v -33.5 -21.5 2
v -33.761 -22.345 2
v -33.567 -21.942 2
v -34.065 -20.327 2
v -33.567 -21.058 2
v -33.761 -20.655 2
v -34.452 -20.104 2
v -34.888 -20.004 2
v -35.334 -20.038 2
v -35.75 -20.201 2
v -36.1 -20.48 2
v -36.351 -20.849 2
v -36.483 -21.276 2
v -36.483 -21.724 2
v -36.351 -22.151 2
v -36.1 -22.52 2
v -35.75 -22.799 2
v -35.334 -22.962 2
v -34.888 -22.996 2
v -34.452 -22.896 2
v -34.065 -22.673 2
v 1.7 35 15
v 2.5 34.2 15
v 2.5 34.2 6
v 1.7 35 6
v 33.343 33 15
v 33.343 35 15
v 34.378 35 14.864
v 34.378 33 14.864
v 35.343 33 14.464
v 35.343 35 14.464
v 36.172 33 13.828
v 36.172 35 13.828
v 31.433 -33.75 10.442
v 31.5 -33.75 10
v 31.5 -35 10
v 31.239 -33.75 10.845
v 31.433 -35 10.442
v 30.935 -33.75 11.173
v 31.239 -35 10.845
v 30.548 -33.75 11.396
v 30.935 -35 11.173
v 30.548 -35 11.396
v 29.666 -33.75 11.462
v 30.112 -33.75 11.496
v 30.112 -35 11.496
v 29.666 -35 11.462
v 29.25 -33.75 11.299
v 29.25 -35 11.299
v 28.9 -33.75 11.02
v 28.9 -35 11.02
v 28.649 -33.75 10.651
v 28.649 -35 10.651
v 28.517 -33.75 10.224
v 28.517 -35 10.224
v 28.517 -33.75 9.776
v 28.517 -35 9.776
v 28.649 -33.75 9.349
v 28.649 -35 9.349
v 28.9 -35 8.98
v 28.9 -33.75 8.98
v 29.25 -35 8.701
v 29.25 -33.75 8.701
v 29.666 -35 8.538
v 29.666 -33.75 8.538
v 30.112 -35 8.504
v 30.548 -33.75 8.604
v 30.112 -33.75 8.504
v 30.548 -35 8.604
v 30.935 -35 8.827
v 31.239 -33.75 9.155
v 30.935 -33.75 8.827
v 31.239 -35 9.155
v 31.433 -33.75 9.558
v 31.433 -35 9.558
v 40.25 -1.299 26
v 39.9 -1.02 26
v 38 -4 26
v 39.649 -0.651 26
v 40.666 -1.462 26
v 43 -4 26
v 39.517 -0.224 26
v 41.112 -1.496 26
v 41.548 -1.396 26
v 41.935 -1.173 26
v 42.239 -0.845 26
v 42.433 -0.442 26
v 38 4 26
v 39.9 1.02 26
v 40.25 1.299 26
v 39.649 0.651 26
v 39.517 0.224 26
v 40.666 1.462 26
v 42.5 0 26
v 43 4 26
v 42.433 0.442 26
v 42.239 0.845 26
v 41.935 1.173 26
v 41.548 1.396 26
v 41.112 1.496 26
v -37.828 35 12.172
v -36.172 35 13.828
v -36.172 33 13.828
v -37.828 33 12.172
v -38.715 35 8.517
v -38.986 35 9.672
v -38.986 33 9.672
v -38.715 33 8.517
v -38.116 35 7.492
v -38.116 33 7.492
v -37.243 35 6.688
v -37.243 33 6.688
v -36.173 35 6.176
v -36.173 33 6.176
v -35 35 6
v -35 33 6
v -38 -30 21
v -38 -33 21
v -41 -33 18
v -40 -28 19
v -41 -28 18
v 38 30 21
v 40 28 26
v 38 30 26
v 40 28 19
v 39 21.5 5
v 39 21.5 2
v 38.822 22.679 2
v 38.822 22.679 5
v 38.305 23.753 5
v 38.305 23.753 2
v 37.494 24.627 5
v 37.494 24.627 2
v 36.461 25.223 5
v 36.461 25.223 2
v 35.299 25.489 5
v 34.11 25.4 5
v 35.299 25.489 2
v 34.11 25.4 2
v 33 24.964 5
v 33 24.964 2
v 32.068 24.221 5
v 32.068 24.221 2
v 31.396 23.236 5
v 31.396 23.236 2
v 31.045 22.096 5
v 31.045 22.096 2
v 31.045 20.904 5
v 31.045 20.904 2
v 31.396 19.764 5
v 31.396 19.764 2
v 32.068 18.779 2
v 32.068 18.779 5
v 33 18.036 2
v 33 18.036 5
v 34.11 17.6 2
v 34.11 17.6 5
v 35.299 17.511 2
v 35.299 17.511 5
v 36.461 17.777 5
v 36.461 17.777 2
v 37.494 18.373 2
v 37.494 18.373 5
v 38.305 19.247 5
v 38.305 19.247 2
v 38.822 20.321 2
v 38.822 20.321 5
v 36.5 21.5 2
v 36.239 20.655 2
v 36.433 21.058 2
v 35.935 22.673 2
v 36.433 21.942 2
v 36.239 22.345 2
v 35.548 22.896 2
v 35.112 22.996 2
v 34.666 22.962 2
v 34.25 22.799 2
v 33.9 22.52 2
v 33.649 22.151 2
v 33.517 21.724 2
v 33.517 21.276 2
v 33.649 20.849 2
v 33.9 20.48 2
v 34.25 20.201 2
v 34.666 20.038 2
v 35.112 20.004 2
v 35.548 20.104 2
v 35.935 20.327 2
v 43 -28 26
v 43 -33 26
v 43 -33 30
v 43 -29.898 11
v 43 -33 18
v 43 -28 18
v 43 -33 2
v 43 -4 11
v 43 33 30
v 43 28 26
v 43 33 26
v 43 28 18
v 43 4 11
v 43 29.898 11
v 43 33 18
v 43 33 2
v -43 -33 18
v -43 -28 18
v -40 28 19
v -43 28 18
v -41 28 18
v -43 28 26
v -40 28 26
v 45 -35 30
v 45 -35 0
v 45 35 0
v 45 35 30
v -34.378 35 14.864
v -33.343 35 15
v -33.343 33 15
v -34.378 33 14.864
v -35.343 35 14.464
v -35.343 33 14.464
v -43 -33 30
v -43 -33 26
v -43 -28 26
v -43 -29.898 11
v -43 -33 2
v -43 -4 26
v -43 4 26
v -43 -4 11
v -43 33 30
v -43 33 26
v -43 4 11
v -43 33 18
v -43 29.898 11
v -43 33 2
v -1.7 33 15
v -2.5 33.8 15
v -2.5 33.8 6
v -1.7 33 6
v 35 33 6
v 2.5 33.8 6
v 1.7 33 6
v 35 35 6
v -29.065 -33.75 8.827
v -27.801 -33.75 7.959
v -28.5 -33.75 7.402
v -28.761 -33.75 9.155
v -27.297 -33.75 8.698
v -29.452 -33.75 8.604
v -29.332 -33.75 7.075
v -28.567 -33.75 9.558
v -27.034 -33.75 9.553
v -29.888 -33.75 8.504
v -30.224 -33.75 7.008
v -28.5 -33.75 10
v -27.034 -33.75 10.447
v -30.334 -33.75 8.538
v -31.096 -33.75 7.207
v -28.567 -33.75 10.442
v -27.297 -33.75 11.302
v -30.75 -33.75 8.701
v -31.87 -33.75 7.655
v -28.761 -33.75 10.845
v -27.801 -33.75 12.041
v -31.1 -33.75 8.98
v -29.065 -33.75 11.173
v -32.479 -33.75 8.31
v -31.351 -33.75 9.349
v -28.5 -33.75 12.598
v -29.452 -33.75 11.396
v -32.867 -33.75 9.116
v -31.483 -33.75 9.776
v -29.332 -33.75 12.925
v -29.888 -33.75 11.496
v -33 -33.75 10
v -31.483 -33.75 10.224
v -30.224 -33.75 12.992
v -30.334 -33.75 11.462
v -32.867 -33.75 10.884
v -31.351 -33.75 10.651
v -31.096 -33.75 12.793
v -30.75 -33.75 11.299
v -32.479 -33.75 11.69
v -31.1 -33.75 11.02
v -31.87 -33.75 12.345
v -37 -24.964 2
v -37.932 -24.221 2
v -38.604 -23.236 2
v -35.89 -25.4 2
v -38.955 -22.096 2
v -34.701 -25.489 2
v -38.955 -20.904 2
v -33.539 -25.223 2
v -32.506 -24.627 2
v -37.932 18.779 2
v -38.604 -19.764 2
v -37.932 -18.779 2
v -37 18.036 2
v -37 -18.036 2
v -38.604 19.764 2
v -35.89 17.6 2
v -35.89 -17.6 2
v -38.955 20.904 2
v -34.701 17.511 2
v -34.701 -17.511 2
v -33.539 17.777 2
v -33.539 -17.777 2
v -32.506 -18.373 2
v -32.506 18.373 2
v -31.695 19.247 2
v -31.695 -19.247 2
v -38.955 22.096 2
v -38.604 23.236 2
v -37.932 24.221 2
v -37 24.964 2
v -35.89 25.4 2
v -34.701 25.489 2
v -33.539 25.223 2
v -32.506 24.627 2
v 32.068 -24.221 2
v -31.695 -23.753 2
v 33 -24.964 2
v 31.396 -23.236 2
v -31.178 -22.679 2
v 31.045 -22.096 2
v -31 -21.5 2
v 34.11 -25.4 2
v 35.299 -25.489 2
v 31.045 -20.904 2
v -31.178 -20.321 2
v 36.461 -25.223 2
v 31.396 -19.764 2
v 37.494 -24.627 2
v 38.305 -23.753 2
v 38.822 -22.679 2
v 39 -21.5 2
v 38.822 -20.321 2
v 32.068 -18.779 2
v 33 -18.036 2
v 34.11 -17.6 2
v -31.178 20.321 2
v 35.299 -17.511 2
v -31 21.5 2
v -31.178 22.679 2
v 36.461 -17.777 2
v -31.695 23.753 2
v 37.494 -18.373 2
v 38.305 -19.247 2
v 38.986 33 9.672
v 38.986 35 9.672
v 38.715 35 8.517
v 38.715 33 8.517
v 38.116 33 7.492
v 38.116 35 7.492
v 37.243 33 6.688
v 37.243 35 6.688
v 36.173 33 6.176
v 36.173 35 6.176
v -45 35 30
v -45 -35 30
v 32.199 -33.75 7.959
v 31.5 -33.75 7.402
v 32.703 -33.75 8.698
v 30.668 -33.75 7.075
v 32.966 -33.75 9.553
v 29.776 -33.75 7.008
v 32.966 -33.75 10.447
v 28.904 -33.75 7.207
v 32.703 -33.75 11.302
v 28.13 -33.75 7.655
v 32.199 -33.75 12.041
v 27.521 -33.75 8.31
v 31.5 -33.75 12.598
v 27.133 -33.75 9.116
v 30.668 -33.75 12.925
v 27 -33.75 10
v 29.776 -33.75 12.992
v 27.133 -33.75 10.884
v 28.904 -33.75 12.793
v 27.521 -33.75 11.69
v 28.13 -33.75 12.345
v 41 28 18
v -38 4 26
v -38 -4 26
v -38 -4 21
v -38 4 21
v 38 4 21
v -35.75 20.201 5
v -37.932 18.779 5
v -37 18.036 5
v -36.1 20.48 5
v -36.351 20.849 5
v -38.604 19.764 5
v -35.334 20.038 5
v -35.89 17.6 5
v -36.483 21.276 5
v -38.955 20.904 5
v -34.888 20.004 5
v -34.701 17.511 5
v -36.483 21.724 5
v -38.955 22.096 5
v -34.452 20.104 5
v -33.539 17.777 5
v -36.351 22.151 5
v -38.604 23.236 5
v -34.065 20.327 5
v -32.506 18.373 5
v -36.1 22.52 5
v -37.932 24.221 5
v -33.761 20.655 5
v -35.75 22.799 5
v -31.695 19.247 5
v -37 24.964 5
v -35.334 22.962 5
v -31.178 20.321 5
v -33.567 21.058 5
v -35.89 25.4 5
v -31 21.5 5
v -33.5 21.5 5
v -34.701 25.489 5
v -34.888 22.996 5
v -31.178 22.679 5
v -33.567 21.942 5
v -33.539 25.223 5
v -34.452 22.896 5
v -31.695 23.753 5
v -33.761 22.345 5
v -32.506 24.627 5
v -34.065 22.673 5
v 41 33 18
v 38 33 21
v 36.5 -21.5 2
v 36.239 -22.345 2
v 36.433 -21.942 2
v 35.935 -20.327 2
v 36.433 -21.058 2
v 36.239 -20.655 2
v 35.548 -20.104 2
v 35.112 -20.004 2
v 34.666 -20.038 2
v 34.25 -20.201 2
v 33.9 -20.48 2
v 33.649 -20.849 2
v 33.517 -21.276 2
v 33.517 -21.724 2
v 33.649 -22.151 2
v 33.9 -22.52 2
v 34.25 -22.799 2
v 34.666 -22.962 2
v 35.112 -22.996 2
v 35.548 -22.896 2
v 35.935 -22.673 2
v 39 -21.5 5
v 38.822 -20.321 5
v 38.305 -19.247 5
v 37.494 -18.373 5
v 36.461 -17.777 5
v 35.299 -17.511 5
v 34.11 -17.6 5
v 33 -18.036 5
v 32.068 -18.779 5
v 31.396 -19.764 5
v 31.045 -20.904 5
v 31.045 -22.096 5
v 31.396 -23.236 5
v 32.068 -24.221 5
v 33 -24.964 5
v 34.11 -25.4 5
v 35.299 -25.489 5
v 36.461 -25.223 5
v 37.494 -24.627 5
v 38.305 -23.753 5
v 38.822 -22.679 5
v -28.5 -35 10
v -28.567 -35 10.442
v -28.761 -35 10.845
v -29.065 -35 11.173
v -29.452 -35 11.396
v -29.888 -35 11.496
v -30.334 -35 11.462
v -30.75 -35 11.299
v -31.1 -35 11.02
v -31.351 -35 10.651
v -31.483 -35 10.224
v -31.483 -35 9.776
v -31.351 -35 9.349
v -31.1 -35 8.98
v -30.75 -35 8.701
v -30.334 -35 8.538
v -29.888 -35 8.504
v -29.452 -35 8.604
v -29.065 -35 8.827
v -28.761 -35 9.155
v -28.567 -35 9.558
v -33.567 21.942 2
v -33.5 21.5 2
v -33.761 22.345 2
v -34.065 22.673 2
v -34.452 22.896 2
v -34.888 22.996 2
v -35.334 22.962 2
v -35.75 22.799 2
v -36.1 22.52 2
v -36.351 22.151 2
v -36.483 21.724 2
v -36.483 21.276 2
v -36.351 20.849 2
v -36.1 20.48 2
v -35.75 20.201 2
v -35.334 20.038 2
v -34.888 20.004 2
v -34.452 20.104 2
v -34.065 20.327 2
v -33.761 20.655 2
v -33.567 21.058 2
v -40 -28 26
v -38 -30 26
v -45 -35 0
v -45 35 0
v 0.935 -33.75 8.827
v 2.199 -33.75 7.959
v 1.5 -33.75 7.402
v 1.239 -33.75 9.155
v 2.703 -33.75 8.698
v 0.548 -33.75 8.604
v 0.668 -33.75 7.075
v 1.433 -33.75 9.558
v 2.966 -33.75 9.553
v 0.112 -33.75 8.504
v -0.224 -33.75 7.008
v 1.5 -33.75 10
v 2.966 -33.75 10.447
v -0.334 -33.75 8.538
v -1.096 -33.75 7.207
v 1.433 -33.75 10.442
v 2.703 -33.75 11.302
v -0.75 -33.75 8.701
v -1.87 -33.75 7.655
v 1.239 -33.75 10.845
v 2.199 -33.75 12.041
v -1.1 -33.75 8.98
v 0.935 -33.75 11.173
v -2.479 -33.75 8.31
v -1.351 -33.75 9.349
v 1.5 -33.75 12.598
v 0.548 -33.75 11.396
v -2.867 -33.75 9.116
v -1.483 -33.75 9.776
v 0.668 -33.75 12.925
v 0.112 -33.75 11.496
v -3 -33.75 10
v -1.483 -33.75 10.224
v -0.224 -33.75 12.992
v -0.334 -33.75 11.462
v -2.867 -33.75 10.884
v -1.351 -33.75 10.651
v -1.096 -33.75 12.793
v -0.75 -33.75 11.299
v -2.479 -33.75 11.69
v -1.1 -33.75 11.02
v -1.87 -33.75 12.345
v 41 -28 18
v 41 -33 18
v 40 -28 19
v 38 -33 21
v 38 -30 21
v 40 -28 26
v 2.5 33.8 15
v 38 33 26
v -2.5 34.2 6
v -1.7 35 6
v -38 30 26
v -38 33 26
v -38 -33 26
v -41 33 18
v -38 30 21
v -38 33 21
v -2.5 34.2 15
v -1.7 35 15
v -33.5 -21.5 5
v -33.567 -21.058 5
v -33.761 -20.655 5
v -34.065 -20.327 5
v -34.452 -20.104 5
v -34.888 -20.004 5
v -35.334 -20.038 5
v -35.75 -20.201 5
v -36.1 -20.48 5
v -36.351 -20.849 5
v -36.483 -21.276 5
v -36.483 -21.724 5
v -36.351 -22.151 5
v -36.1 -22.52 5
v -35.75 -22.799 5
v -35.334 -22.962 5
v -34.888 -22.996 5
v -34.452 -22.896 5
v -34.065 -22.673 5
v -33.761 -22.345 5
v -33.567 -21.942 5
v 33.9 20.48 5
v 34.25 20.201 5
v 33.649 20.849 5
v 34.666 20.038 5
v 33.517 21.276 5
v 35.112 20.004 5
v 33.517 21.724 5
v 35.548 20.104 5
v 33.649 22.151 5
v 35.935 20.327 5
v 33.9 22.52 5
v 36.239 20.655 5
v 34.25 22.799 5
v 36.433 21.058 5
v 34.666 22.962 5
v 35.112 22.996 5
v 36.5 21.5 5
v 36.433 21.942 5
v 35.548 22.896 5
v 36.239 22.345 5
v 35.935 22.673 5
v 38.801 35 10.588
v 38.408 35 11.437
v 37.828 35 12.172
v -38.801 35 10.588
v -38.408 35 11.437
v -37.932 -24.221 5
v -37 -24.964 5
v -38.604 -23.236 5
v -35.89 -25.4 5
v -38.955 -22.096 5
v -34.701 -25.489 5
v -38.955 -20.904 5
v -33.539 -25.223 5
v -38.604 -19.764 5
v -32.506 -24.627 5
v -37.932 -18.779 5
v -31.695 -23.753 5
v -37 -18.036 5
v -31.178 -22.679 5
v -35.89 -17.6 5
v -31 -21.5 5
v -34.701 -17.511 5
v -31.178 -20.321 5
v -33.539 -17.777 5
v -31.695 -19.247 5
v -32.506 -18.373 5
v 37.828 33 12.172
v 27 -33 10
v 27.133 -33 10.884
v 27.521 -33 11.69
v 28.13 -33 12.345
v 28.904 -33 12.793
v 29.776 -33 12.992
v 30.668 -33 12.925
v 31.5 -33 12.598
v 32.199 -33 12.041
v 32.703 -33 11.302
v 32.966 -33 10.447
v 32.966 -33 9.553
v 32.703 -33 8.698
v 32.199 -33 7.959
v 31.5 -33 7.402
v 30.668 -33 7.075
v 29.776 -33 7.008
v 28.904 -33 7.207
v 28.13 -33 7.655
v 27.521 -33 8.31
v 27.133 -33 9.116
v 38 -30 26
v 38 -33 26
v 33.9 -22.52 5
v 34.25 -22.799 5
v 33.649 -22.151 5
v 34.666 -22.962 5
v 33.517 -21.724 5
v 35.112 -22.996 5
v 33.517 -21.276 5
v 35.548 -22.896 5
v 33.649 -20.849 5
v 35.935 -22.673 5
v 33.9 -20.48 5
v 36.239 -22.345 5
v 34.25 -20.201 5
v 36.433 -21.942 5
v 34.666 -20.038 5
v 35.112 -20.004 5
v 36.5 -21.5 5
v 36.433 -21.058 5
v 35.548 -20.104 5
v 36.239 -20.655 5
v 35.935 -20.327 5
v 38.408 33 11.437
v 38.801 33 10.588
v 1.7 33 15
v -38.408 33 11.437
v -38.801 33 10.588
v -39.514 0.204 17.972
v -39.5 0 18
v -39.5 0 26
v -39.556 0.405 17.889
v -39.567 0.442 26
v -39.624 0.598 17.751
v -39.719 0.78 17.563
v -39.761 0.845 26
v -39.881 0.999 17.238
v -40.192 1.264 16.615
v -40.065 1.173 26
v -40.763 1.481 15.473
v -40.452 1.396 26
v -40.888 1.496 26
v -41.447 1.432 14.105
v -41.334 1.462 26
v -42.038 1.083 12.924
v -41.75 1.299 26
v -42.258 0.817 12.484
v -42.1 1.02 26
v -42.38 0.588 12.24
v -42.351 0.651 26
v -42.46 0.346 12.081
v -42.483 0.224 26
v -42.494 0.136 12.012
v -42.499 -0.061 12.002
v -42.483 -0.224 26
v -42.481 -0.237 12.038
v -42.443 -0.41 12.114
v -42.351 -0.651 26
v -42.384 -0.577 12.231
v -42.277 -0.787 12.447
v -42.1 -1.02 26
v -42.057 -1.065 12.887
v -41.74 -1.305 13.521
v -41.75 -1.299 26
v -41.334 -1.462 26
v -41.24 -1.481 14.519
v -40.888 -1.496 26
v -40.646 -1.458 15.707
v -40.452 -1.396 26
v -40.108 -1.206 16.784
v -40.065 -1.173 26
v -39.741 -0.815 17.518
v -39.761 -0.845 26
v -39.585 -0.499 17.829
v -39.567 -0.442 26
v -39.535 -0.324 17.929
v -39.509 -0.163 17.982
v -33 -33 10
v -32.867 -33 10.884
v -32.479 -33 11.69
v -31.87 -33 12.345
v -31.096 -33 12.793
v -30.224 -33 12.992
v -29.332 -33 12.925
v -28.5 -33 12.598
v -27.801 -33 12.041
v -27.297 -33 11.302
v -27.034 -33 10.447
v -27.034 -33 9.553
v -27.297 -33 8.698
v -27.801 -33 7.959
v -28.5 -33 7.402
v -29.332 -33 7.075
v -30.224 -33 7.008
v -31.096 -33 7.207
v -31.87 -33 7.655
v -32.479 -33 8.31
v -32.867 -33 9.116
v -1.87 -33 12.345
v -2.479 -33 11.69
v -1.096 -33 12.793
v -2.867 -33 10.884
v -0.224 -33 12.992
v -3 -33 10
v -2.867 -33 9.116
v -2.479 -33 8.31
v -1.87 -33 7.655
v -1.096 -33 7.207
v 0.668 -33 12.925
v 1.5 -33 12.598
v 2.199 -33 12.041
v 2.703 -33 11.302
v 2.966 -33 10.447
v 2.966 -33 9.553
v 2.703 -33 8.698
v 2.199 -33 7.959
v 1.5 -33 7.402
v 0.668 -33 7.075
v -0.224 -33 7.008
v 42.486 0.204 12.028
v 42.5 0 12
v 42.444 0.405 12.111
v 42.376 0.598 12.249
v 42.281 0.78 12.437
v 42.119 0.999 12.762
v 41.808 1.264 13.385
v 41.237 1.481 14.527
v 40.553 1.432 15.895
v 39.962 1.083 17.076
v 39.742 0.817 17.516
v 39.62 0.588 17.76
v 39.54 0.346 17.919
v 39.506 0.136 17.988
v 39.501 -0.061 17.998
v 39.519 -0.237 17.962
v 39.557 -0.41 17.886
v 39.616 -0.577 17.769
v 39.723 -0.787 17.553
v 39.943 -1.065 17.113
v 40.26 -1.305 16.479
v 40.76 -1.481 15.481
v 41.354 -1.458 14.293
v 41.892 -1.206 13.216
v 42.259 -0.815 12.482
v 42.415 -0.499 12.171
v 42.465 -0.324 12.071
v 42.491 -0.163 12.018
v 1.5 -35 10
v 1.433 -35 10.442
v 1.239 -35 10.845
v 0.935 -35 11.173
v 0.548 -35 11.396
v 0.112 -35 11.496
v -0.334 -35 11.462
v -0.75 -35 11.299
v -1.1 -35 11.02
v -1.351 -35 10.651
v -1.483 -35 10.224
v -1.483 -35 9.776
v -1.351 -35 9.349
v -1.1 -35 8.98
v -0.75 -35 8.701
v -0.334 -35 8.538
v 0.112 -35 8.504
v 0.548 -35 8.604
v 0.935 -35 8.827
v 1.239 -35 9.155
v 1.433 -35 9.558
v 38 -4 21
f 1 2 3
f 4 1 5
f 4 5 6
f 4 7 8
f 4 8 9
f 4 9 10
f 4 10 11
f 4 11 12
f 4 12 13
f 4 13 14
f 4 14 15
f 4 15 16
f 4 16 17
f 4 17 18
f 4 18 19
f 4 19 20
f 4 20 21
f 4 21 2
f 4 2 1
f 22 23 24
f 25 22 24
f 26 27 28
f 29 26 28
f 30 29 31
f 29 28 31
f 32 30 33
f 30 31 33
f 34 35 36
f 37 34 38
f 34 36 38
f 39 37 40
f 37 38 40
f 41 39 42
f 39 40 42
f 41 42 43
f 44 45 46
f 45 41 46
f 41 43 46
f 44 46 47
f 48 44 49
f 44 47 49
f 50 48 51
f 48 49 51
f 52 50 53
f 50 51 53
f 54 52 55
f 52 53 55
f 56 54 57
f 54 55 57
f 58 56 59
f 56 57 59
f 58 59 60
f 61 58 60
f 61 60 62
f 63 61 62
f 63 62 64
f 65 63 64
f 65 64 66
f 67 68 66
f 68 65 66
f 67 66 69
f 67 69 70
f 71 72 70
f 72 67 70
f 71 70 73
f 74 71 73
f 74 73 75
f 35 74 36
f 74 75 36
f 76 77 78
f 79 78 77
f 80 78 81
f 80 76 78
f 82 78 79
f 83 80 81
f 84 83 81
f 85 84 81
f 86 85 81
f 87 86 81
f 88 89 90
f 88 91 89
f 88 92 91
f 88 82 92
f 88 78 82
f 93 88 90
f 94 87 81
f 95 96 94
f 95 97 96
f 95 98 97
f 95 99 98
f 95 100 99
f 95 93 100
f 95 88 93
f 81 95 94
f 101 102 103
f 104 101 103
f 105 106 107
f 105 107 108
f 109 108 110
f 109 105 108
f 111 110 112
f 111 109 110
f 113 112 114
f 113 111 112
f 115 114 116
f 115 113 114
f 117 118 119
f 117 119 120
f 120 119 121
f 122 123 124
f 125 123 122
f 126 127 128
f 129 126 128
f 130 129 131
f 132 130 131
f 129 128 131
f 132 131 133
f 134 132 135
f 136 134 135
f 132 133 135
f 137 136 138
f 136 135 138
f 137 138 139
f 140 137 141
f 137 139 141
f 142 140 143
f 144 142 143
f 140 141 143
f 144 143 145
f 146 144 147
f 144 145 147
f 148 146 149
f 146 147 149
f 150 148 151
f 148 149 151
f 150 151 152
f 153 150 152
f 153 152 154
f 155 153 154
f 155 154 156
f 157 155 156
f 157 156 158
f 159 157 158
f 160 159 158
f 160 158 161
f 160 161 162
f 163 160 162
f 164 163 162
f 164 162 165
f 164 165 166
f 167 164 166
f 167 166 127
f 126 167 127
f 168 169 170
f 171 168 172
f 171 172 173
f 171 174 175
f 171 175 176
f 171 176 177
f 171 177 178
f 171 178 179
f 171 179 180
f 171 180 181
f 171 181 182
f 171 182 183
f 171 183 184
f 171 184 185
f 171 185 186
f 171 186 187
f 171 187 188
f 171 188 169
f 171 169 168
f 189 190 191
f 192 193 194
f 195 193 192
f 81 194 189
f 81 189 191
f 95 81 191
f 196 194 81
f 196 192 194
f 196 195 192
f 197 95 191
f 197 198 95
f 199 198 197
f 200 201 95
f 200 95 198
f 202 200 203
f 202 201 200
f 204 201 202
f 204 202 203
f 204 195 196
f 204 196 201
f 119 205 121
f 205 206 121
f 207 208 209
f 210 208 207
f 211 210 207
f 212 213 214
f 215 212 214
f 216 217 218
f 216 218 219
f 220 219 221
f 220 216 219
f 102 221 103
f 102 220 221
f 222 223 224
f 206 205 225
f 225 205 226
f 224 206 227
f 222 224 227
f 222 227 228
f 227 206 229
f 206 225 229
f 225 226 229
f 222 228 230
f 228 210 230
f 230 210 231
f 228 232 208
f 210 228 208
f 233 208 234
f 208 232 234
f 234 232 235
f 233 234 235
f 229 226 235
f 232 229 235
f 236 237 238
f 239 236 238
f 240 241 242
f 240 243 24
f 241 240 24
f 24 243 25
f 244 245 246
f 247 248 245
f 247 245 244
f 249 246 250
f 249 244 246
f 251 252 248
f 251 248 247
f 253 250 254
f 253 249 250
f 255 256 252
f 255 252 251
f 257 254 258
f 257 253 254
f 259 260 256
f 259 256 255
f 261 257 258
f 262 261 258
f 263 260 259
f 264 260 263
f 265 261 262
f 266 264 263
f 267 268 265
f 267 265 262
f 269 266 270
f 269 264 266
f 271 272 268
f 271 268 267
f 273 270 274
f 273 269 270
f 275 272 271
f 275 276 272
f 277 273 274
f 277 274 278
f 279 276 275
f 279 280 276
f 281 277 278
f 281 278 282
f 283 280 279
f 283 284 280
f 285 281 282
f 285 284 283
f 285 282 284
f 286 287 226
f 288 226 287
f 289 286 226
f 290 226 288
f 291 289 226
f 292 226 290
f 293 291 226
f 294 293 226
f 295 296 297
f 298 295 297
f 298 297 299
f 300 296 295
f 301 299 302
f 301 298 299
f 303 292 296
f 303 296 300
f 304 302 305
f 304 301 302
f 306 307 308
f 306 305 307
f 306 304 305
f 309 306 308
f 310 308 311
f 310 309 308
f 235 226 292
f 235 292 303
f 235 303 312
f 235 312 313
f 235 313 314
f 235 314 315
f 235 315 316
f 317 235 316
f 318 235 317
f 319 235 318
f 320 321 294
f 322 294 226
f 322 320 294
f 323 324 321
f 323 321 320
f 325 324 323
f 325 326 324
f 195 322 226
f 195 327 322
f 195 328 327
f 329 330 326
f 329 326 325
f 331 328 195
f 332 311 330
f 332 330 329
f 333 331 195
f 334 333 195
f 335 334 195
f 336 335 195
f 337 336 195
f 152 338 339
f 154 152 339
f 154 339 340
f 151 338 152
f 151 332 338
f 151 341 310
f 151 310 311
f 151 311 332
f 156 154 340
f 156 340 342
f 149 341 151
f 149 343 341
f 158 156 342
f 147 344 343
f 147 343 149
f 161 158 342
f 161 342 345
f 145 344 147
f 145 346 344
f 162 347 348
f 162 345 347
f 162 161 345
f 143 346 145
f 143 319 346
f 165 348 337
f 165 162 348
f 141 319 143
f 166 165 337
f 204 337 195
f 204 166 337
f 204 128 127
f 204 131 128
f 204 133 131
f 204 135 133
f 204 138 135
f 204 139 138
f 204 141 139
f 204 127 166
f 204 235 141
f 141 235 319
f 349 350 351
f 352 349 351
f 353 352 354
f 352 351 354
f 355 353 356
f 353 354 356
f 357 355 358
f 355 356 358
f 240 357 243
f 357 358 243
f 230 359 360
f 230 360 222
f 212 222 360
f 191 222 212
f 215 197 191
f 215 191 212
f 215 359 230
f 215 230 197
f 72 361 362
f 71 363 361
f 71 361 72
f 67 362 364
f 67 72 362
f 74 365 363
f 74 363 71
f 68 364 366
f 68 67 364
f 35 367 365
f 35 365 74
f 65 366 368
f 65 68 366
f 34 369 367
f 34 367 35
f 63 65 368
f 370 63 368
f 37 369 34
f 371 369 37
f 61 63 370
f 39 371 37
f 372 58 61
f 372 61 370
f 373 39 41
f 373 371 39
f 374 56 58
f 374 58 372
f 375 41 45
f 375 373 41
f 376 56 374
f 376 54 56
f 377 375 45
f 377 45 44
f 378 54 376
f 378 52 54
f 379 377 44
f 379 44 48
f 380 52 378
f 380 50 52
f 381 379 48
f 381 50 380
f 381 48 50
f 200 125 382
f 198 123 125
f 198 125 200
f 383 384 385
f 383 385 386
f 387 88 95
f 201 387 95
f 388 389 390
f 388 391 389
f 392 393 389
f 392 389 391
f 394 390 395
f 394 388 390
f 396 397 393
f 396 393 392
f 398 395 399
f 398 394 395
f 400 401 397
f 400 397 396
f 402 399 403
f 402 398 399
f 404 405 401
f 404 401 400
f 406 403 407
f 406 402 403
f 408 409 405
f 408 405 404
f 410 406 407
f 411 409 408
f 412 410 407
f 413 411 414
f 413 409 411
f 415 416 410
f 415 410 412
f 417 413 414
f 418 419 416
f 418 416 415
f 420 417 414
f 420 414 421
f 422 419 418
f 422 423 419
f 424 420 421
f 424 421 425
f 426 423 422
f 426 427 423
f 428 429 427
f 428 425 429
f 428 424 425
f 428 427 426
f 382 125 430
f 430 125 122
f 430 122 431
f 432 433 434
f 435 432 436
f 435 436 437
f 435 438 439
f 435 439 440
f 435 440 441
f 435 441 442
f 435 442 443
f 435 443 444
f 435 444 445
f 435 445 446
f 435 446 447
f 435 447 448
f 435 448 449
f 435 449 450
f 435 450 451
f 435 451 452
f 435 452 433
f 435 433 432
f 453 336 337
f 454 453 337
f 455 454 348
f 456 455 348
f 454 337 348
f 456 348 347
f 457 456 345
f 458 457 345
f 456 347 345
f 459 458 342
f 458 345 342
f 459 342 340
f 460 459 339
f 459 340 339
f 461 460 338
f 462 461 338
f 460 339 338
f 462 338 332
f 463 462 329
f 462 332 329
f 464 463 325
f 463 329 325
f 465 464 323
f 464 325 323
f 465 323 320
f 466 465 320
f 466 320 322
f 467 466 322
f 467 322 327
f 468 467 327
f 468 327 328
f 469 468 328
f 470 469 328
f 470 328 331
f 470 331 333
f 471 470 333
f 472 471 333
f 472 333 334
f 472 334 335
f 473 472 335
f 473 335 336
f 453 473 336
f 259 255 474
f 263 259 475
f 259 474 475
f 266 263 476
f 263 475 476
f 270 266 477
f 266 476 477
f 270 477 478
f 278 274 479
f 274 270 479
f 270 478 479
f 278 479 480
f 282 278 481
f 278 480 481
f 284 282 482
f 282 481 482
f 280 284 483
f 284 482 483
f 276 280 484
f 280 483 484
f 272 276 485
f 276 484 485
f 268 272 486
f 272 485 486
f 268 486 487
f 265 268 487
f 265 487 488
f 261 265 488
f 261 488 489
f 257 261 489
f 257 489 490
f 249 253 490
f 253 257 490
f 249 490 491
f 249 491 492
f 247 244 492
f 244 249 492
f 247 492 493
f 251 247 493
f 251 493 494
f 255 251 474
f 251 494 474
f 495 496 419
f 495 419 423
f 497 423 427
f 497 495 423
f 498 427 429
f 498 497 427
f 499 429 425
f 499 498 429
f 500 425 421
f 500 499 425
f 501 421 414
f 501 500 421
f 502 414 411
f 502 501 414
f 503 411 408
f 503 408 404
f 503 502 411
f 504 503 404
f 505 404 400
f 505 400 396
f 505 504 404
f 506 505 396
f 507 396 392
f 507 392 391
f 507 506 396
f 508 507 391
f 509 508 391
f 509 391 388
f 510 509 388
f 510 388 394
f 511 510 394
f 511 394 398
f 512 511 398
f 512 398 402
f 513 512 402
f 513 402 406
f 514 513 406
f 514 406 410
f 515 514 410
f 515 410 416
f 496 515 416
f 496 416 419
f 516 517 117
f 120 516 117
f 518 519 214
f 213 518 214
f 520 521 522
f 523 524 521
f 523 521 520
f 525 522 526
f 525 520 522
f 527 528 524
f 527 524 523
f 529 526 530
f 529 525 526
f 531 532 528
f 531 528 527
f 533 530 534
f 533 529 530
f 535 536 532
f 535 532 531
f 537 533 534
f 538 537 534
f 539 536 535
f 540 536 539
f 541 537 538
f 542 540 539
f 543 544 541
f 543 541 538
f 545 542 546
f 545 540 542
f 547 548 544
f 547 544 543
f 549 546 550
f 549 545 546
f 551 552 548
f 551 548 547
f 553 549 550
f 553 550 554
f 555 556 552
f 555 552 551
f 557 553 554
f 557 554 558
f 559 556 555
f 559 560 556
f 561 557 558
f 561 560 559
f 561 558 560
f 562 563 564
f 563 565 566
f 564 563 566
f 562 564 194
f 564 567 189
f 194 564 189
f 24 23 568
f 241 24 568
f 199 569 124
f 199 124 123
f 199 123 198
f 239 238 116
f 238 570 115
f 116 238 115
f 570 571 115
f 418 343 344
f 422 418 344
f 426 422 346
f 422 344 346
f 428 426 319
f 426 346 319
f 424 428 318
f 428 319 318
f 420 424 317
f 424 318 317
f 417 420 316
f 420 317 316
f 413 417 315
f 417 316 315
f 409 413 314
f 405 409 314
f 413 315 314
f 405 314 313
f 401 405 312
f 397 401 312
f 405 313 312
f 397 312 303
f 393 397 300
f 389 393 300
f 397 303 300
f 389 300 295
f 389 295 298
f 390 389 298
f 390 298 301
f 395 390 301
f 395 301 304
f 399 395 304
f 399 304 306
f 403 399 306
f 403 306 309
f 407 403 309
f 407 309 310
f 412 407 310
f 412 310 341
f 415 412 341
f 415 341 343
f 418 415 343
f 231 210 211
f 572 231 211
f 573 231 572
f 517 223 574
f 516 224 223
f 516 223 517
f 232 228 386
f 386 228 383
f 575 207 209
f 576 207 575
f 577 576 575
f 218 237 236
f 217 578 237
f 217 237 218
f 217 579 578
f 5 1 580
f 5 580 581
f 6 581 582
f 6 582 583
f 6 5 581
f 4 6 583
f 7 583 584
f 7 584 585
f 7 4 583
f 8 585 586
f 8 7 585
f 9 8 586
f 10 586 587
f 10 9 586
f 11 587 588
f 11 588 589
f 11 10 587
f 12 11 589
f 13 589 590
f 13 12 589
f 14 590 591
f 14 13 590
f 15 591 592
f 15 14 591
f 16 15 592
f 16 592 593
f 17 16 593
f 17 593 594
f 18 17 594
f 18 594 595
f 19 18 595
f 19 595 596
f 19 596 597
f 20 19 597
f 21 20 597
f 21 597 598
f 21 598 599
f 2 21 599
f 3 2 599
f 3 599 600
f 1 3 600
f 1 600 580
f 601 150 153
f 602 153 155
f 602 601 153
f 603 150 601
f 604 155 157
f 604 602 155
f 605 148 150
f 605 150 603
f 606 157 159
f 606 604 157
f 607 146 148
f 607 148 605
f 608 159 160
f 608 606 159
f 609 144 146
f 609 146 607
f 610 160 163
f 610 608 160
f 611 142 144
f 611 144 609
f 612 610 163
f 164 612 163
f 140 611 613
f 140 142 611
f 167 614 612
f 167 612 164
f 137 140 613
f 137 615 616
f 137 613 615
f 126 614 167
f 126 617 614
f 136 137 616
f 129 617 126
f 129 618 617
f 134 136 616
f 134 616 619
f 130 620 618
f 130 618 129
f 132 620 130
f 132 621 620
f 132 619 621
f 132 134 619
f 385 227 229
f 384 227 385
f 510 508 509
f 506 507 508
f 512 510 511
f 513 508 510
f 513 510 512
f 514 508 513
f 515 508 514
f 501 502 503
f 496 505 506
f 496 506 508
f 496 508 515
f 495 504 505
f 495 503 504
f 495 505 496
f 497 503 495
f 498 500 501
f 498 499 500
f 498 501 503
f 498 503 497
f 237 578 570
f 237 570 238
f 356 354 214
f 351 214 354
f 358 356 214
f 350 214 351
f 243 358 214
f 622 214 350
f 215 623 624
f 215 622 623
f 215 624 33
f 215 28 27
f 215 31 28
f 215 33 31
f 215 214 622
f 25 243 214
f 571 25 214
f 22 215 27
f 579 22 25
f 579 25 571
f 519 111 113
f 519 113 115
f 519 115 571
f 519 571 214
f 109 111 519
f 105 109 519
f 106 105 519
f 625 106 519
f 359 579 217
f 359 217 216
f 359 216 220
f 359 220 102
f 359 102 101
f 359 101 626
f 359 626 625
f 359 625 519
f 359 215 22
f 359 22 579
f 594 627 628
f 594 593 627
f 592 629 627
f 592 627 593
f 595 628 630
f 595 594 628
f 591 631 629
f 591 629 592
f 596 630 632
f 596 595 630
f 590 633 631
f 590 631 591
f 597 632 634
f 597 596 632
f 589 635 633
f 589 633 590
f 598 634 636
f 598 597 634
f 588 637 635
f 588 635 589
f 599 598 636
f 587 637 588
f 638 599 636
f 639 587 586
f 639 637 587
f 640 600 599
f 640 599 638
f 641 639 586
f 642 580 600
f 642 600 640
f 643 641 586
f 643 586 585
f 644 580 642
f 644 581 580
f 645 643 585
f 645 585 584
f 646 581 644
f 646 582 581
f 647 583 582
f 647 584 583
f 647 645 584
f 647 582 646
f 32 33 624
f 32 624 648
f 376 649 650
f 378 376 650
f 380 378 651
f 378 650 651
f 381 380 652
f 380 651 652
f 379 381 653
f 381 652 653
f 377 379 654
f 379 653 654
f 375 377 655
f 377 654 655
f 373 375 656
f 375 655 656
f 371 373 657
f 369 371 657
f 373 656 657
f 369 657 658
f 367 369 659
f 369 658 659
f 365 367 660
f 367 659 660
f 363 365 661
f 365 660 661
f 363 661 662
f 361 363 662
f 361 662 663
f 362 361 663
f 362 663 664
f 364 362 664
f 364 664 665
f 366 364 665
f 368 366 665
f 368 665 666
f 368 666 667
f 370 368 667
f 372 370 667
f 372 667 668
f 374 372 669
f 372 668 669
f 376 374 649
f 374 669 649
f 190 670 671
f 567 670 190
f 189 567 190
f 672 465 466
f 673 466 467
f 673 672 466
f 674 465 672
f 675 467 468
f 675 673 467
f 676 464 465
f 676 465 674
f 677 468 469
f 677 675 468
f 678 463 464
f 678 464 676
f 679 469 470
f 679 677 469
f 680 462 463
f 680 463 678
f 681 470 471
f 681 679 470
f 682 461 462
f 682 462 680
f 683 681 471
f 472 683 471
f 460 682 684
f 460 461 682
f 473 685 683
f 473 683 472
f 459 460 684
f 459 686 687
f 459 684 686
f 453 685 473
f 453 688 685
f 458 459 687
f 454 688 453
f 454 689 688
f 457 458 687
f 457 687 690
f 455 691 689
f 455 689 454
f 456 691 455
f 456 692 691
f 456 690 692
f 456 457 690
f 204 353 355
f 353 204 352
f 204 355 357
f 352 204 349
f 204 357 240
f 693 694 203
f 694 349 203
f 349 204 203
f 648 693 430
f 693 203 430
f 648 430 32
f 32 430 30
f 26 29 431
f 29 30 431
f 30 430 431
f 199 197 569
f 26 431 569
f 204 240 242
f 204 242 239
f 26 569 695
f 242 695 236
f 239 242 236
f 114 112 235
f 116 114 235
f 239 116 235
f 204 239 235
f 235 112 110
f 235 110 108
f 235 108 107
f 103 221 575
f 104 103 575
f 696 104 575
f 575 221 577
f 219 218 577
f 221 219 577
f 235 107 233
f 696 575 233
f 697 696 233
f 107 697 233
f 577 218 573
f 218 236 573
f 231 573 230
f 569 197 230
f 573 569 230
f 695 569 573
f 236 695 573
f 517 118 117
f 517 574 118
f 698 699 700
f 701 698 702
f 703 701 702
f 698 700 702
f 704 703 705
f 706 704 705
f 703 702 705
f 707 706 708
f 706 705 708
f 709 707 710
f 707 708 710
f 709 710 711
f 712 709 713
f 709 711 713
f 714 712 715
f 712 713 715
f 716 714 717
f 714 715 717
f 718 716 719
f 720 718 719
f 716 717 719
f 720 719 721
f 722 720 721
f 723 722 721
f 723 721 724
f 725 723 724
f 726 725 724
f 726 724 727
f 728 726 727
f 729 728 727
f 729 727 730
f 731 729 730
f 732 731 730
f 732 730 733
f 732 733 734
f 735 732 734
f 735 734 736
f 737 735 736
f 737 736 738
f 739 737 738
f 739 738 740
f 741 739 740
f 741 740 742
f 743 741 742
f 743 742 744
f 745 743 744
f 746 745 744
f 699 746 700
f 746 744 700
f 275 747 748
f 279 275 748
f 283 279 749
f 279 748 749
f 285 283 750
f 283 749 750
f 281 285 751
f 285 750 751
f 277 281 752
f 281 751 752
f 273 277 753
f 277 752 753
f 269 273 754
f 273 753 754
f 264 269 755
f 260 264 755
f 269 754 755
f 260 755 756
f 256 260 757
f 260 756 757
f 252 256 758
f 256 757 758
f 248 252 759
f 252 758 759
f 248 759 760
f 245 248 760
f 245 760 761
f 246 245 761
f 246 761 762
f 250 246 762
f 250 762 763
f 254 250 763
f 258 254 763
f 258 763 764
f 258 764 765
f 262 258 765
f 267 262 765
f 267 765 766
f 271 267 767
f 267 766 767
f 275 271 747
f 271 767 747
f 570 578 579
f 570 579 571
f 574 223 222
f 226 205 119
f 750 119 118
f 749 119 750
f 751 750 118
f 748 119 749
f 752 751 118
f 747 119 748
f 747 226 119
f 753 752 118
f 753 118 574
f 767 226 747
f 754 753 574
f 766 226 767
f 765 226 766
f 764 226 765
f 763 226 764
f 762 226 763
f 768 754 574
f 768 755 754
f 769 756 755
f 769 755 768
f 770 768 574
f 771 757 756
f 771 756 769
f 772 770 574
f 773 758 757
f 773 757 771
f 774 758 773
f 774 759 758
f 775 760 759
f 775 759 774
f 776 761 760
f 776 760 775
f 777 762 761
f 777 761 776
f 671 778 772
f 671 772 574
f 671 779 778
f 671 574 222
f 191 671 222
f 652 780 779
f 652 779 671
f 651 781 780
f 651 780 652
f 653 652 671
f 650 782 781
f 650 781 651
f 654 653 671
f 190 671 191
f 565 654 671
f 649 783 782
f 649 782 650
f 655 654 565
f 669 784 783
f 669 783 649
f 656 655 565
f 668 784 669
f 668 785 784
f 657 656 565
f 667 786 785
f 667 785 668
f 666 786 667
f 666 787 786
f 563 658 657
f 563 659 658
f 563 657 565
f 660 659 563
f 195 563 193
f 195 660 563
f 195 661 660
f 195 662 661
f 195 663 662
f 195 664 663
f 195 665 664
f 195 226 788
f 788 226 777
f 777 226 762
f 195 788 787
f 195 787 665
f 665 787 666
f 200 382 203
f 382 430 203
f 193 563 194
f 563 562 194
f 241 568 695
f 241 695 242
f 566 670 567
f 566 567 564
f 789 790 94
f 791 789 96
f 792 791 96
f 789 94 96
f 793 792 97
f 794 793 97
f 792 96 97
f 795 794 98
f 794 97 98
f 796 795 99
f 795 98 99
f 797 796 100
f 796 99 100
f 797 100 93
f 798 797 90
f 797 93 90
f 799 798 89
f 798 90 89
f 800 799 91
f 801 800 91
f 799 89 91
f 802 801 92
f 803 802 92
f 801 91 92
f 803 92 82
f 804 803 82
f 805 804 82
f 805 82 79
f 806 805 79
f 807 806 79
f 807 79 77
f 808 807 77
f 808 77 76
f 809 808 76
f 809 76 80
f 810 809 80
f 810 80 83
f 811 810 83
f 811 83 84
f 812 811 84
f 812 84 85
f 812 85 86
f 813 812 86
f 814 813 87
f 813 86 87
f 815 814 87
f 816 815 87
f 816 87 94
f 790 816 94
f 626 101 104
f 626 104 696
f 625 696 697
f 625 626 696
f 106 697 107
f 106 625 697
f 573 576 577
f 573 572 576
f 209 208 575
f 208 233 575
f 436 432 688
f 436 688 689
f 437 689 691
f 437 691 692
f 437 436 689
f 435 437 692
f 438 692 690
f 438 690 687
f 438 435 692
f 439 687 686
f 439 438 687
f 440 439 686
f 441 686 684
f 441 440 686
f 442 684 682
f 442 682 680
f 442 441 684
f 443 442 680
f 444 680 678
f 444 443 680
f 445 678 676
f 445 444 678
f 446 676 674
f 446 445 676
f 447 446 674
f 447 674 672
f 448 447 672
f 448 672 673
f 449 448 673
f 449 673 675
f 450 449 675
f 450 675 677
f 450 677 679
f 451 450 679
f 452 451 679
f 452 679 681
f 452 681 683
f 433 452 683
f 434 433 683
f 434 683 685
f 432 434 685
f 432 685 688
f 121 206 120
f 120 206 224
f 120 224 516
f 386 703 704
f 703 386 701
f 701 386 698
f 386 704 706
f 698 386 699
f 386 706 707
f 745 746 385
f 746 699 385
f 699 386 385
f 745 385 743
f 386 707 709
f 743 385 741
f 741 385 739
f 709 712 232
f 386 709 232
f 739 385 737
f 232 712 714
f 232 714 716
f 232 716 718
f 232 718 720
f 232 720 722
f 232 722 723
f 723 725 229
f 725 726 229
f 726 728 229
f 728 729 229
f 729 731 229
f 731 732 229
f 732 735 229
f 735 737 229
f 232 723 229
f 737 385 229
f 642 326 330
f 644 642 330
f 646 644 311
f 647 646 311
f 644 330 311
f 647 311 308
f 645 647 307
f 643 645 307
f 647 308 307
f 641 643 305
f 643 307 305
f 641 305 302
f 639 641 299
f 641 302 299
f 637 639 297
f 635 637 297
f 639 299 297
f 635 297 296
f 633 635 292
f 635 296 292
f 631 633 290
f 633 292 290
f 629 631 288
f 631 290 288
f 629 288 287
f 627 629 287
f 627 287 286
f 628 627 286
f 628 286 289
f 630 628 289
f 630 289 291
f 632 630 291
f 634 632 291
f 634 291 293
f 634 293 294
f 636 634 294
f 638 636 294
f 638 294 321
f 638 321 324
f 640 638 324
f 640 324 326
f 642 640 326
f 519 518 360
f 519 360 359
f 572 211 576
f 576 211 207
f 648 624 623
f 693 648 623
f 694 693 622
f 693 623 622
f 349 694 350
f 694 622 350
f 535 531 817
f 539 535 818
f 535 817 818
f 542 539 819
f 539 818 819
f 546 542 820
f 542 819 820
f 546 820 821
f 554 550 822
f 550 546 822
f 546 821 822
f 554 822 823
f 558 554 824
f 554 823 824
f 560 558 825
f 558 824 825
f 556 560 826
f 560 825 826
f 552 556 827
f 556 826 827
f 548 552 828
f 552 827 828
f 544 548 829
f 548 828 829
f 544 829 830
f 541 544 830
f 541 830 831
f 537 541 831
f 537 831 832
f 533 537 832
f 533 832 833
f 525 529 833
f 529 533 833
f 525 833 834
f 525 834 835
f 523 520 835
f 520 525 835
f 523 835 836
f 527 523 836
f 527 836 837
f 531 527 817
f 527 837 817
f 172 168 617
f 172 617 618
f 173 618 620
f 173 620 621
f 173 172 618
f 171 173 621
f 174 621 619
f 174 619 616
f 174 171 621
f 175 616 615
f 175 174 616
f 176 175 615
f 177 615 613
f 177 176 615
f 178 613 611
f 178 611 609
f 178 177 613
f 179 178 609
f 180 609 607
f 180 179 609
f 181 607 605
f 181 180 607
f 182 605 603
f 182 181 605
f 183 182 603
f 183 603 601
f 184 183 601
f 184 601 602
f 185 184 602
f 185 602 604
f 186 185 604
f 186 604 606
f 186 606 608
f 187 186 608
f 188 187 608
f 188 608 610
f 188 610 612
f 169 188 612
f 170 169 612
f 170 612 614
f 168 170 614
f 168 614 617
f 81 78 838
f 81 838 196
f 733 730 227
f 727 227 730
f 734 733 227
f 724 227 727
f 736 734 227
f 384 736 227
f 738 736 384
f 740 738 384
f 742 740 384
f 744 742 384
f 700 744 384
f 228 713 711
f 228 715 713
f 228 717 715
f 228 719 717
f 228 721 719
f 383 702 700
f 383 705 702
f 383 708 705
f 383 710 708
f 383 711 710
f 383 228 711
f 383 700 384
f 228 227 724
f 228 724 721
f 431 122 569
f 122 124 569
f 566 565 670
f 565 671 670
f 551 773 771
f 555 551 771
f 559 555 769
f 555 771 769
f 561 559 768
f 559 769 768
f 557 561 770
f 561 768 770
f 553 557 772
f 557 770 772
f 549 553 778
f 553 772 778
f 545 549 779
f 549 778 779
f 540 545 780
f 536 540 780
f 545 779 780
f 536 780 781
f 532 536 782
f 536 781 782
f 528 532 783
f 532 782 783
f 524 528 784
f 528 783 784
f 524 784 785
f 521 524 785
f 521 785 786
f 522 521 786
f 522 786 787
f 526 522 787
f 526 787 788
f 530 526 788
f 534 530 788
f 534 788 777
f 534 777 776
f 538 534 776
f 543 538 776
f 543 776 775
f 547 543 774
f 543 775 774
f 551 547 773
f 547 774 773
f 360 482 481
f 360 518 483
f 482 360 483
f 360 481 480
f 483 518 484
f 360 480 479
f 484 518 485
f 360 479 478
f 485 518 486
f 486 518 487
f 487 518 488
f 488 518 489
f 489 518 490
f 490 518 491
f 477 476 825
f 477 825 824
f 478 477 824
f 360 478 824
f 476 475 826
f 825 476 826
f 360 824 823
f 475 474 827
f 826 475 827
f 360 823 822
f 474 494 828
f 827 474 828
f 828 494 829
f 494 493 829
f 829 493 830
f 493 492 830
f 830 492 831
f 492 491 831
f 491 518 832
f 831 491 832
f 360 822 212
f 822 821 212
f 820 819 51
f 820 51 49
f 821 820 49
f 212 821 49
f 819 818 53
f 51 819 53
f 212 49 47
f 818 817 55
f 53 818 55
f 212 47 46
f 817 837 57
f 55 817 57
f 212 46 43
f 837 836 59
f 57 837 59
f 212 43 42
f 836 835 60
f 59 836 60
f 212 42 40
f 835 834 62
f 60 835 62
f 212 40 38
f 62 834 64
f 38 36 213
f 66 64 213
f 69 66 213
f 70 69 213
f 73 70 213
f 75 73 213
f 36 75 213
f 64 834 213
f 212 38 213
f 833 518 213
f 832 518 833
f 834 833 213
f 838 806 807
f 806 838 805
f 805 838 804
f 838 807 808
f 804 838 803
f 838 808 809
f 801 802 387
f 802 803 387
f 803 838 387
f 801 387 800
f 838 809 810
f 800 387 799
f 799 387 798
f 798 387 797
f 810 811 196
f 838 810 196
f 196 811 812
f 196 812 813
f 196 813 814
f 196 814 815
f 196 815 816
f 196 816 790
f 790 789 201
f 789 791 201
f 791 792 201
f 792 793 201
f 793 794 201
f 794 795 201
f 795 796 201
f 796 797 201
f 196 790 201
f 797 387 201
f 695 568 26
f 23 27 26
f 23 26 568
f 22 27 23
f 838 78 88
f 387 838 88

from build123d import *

# Parameters (mm, degrees)
F0_R         = 4
F0_R_2       = 1.5
F1_DEPTH     = 5
F0_W         = 86
F0_H         = 66
F2_DEPTH     = 2
F0_W_2       = 90
F0_H_2       = 70
F3_DEPTH     = 30
F4_R         = 1.5
F5_DEPTH     = 2
F6_R         = 3
F6_R_2       = 1.5
F7_DEPTH     = 0.75
F9_W         = 5
F9_H         = 5
F10_DEPTH    = 8
F11_C1_SIZE  = 3
F11_C2_SIZE  = 3
F11_C3_SIZE  = 3
F11_C4_SIZE  = 3
F12_SIZE     = 2
F13_W        = 78
F13_H        = 9
F14_DEPTH    = 2
F15_SIZE     = 4
F16_T1_DEPTH = 2
F17_W        = 5
F17_H        = 2
F18_DEPTH    = 9
F19_SIZE     = 0.8
F9_H_2       = 8
F9_R         = 1.5
F20_DEPTH    = 15
F21_T4_DEPTH = 59.7965774757
F21_T9_DEPTH = 59.7965774757


# Not quite as in the source:
# - a fillet or chamfer that OpenCascade refuses, or shapes differently, is made with other operations: its cross-section is extruded or revolved along the edge and cut away or added
# - two fillets or chamfers of one size are made in one step


with BuildPart() as f1:
    # F0 (on Top) → F1 (new body)
    with BuildSketch(Plane.XY):
        with Locations((-35, 21.5)):
            Circle(F0_R)
        with Locations((-35, 21.5)):
            Circle(F0_R_2, mode=Mode.SUBTRACT)
    extrude(amount=F1_DEPTH)



with BuildPart() as f1b:
    # F0 (on Top) → F1, piece 2 (new body)
    with BuildSketch(Plane.XY):
        with Locations((35, 21.5)):
            Circle(F0_R)
        with Locations((35, 21.5)):
            Circle(F0_R_2, mode=Mode.SUBTRACT)
    extrude(amount=F1_DEPTH)


with BuildPart() as f1c:
    # F0 (on Top) → F1, piece 3 (new body)
    with BuildSketch(Plane.XY):
        with Locations((35, -21.5)):
            Circle(F0_R)
        with Locations((35, -21.5)):
            Circle(F0_R_2, mode=Mode.SUBTRACT)
    extrude(amount=F1_DEPTH)


with BuildPart() as f1d:
    # F0 (on Top) → F1, piece 4 (new body)
    with BuildSketch(Plane.XY):
        with Locations((-35, -21.5)):
            Circle(F0_R)
        with Locations((-35, -21.5)):
            Circle(F0_R_2, mode=Mode.SUBTRACT)
    extrude(amount=F1_DEPTH)


with BuildPart() as f1_1:
    add(f1.part)

    add(f1b.part)  # F2 merges F1b

    add(f1c.part)  # F2 merges F1c

    add(f1d.part)  # F2 merges F1d
    # F0 (on Top) → F2 (join)
    with BuildSketch(Plane.XY):
        Rectangle(F0_W, F0_H)
        with Locations((-35, -21.5)):
            Circle(F0_R, mode=Mode.SUBTRACT)
        with Locations((35, -21.5)):
            Circle(F0_R, mode=Mode.SUBTRACT)
        with Locations((-35, 21.5)):
            Circle(F0_R, mode=Mode.SUBTRACT)
        with Locations((35, 21.5)):
            Circle(F0_R, mode=Mode.SUBTRACT)
        with Locations((-35, 21.5)):
            Circle(F0_R)
        with Locations((-35, 21.5)):
            Circle(F0_R_2, mode=Mode.SUBTRACT)
        with Locations((35, 21.5)):
            Circle(F0_R_2)
        with Locations((35, -21.5)):
            Circle(F0_R_2)
        with Locations((-35, -21.5)):
            Circle(F0_R_2)
        with Locations((-35, 21.5)):
            Circle(F0_R_2)
    extrude(amount=F2_DEPTH)

    # F0 (on Top) → F3 (join)
    with BuildSketch(Plane.XY):
        Rectangle(F0_W_2, F0_H_2)
        Rectangle(F0_W, F0_H, mode=Mode.SUBTRACT)
    extrude(amount=F3_DEPTH)

    # F4 (on face) → F5 (cut, through all)
    with BuildSketch(Plane.XZ.offset(35)):
        with Locations((-30, 10)):
            Circle(F4_R)
        with Locations((0, 10)):
            Circle(F4_R)
        with Locations((30, 10)):
            Circle(F4_R)
    extrude(amount=-F5_DEPTH, mode=Mode.SUBTRACT)

    # F6 (on face) → F7 (cut)
    with BuildSketch(Plane(origin=(0, -33, 0), x_dir=(-1, 0, 0), z_dir=(0, 1, 0))):
        with Locations((-30, 10)):
            Circle(F6_R)
        with Locations((-30, 10)):
            Circle(F6_R_2, mode=Mode.SUBTRACT)
        with Locations((0, 10)):
            Circle(F6_R)
        with Locations((0, 10)):
            Circle(F6_R_2, mode=Mode.SUBTRACT)
        with Locations((30, 10)):
            Circle(F6_R)
        with Locations((30, 10)):
            Circle(F6_R_2, mode=Mode.SUBTRACT)
    extrude(amount=-F7_DEPTH, mode=Mode.SUBTRACT)

    # F9 (on offset) → F10 (join)
    with BuildSketch(Plane.XY.offset(26)):
        with Locations((40.5, -30.5)):
            Rectangle(F9_W, F9_H)
        with Locations((40.5, 30.5)):
            Rectangle(F9_W, F9_H)
        with Locations((-40.5, -30.5)):
            Rectangle(F9_W, F9_H)
        with Locations((-40.5, 30.5)):
            Rectangle(F9_W, F9_H)
    extrude(amount=-F10_DEPTH)

    # F11: chamfer of 3 on 4 edges, made by hand

    # F11_c1
    f11_c1_edges = [f1_1.edges().sort_by_distance(p)[0] for p in [
        (-38, -30.5, 18),
    ]]
    chamfer(f11_c1_edges, length=F11_C1_SIZE)

    # F11_c2
    f11_c2_edges = [f1_1.edges().sort_by_distance(p)[0] for p in [
        (38, -30.5, 18),
    ]]
    chamfer(f11_c2_edges, length=F11_C2_SIZE)

    # F11_c3
    f11_c3_edges = [f1_1.edges().sort_by_distance(p)[0] for p in [
        (-38, 30.5, 18),
    ]]
    chamfer(f11_c3_edges, length=F11_C3_SIZE)

    # F11_c4
    f11_c4_edges = [f1_1.edges().sort_by_distance(p)[0] for p in [
        (38, 30.5, 18),
    ]]
    chamfer(f11_c4_edges, length=F11_C4_SIZE)

    # F12
    f12_edges = [f1_1.edges().sort_by_distance(p)[0] for p in [
        (-38, 28, 23.5),
        (-38, -28, 23.5),
        (38, -28, 23.5),
        (38, 28, 23.5),
    ]]
    chamfer(f12_edges, length=F12_SIZE)

    # F13 (on face) → F14 (cut, through all)
    with BuildSketch(Plane(origin=(0, 35, 0), x_dir=(-1, 0, 0), z_dir=(0, 1, 0))):
        with Locations((0, 10.5)):
            Rectangle(F13_W, F13_H)
    extrude(amount=-F14_DEPTH, mode=Mode.SUBTRACT)

    # F15
    f15_edges = [f1_1.edges().sort_by_distance(p)[0] for p in [
        (-39, 34, 15),
        (39, 34, 15),
    ]]
    chamfer(f15_edges, length=F15_SIZE)

    # F16: fillet of radius 4 on 6 edges, made by hand

    # F16_s2 → F16_t1 (join)
    with BuildSketch(Plane.XZ.offset(-35)):
        with BuildLine():
            ThreePointArc((-39, 10), (-37.8284271247, 7.1715728753), (-35, 6))
            Line((-35, 6), (-39, 6))
            Line((-39, 6), (-39, 10))
        make_face()
        with BuildLine():
            ThreePointArc((39, 10), (37.8284271247, 7.1715728753), (35, 6))
            Line((35, 6), (39, 6))
            Line((39, 6), (39, 10))
        make_face()
        with BuildLine():
            ThreePointArc((-33.3431457505, 15), (-34.87387948, 14.69551813), (-36.1715728753, 13.8284271247))
            Line((-36.1715728753, 13.8284271247), (-35, 15))
            Line((-35, 15), (-33.3431457505, 15))
        make_face()
        with BuildLine():
            ThreePointArc((33.3431457505, 15), (34.87387948, 14.69551813), (36.1715728753, 13.8284271247))
            Line((36.1715728753, 13.8284271247), (35, 15))
            Line((35, 15), (33.3431457505, 15))
        make_face()
        with BuildLine():
            ThreePointArc((-37.8284271247, 12.1715728753), (-38.69551813, 10.87387948), (-39, 9.3431457505))
            Line((-39, 9.3431457505), (-39, 11))
            Line((-39, 11), (-37.8284271247, 12.1715728753))
        make_face()
        with BuildLine():
            ThreePointArc((37.8284271247, 12.1715728753), (38.69551813, 10.87387948), (39, 9.3431457505))
            Line((39, 9.3431457505), (39, 11))
            Line((39, 11), (37.8284271247, 12.1715728753))
        make_face()
    extrude(amount=F16_T1_DEPTH)

    # F17 (on face) → F18 (join, through all)
    with BuildSketch(Plane(origin=(0, 0, 15), x_dir=(1, 0, 0), z_dir=(0, 0, -1))):
        with Locations((0, -34)):
            Rectangle(F17_W, F17_H)
    extrude(amount=F18_DEPTH)

    # F19
    f19_edges = [f1_1.edges().sort_by_distance(p)[0] for p in [
        (2.5, 35, 10.5),
        (-2.5, 35, 10.5),
        (2.5, 33, 10.5),
        (-2.5, 33, 10.5),
    ]]
    chamfer(f19_edges, length=F19_SIZE)

    # F9 (on offset) → F20 (join)
    with BuildSketch(Plane.XY.offset(26)):
        with Locations((-40.5, 0)):
            Rectangle(F9_W, F9_H_2)
        with Locations((-41, 0)):
            Circle(F9_R, mode=Mode.SUBTRACT)
        with Locations((40.5, 0)):
            Rectangle(F9_W, F9_H_2)
        with Locations((41, 0)):
            Circle(F9_R, mode=Mode.SUBTRACT)
    extrude(amount=-F20_DEPTH)

    # F21: chamfer of 5 x 10 on 2 edges, made by hand


with BuildPart() as f21_tool2:
    # F21_s3 → F21_t4 (new body)
    with BuildSketch(Plane.XZ.offset(-29.8982887379)):
        Polygon((38, 21), (43, 11), (38, 11), align=None)
    extrude(amount=F21_T4_DEPTH)

    split(bisect_by=Plane.YZ.offset(43), keep=Keep.BOTTOM)


with BuildPart() as f1_2:
    add(f1_1.part)

    # F21_t1: cut F21_tool2
    add(f21_tool2.part, mode=Mode.SUBTRACT)


with BuildPart() as f21_tool7:
    # F21_s8 → F21_t9 (new body)
    with BuildSketch(Plane.XZ.offset(29.8982887379)):
        Polygon((-38, 21), (-43, 11), (-38, 11), align=None)
    extrude(amount=-F21_T9_DEPTH)

    split(bisect_by=Plane.YZ.offset(-43), keep=Keep.TOP)


with BuildPart() as f1_3:
    add(f1_2.part)

    # F21_t6: cut F21_tool7
    add(f21_tool7.part, mode=Mode.SUBTRACT)


solid = f1_3.part
